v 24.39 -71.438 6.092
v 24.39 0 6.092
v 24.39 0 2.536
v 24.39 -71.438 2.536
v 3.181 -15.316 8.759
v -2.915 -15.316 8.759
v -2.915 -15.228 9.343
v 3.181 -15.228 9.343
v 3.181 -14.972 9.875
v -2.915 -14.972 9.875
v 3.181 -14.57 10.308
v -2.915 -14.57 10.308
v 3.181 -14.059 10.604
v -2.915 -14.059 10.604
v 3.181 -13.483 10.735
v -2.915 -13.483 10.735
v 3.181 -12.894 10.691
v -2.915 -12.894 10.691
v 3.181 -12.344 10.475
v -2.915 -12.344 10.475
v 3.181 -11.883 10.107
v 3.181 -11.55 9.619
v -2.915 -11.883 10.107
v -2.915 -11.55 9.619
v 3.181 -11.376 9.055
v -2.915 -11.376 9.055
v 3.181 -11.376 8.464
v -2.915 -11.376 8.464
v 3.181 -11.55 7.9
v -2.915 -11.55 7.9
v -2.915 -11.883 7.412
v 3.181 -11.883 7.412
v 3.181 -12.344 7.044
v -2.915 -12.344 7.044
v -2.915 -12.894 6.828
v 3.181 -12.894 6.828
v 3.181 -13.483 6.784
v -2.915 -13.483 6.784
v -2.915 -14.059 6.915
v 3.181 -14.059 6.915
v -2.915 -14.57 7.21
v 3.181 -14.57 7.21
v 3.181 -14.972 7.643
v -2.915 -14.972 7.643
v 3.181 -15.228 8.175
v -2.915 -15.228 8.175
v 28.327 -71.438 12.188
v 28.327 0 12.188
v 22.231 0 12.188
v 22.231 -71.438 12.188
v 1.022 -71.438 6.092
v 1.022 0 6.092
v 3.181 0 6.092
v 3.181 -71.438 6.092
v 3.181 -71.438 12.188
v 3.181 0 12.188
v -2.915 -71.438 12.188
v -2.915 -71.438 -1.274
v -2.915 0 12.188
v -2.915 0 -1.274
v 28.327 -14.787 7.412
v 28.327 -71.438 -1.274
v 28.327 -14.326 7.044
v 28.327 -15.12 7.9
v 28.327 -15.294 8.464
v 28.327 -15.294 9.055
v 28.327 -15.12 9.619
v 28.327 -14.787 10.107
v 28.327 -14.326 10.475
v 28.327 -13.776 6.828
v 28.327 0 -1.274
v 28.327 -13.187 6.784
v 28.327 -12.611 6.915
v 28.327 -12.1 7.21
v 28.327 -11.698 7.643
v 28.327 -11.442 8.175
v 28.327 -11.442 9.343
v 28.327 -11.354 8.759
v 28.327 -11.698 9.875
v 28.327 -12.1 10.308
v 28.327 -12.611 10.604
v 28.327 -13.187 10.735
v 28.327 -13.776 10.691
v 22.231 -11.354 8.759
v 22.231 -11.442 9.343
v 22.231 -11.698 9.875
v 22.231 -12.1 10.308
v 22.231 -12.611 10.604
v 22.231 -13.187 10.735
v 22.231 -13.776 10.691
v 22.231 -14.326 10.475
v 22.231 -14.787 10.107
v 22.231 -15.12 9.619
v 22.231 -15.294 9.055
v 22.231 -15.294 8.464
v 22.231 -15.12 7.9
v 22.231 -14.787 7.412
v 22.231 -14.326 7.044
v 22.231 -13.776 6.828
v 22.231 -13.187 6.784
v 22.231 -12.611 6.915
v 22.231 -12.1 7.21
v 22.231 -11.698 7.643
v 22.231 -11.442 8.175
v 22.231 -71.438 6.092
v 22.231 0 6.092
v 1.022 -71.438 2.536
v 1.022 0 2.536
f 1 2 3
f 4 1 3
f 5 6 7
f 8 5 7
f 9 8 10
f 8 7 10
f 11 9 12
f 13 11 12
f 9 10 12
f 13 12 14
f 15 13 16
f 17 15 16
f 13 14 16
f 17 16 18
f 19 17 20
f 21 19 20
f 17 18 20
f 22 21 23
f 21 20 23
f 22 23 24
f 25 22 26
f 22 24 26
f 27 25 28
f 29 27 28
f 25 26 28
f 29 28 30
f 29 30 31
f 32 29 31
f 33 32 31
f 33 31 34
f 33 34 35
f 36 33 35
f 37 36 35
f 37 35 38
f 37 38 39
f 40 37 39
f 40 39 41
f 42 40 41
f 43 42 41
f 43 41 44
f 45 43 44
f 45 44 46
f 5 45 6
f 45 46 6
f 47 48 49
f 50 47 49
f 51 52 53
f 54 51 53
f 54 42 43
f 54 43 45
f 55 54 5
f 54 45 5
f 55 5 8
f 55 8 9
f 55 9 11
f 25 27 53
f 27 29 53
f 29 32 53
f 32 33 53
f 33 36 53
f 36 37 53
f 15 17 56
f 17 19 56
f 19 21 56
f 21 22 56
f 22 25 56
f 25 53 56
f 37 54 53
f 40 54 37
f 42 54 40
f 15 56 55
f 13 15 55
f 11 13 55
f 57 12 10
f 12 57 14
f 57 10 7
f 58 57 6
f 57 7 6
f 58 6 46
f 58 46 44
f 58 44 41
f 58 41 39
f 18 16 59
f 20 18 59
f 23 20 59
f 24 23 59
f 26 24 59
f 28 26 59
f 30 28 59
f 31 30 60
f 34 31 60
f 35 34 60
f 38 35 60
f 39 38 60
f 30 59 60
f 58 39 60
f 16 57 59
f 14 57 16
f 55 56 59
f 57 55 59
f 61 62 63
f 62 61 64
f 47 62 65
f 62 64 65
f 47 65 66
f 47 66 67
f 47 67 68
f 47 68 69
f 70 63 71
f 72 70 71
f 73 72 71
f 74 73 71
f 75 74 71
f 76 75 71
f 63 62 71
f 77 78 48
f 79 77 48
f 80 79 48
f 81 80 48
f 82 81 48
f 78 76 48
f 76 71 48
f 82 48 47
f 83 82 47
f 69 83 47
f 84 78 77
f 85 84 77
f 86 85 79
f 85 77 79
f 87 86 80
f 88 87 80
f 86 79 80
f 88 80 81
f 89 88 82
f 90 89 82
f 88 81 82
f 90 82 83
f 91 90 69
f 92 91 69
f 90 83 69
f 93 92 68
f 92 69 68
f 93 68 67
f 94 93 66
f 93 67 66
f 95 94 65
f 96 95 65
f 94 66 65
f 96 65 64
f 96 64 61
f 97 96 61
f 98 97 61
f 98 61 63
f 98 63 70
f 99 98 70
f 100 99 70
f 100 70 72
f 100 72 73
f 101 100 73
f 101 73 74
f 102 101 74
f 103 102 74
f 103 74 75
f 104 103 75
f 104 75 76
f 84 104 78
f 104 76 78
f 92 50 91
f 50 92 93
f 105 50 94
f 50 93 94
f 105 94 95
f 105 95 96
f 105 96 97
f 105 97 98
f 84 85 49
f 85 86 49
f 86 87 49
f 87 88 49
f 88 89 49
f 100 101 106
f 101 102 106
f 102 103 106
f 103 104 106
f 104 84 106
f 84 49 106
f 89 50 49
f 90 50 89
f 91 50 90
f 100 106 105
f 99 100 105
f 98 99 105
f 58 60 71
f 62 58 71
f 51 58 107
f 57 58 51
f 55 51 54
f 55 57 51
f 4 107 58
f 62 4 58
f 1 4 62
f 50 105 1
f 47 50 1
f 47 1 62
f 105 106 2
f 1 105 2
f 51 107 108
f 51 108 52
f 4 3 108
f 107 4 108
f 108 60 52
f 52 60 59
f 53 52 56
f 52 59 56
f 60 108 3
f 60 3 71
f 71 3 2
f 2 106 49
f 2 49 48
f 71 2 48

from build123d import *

# Parameters (mm, degrees)
F1_DEPTH = 71.4375
F2_R     = 1.9812
F3_DEPTH = 6.096
F4_R     = 1.9812
F5_DEPTH = 6.096


with BuildPart() as f1:
    # F0 (on Front) → F1 (new body)
    with BuildSketch(Plane.XZ):
        Polygon((3.181334, 6.092442), (3.181334, 12.188442), (-2.914666, 12.188442), (-2.914666, -1.273558), (28.327334, -1.273558), (28.327334, 12.188442), (22.231334, 12.188442), (22.231334, 6.092442), (24.390334, 6.092442), (24.390334, 2.536442), (1.022334, 2.536442), (1.022334, 6.092442), align=None)
    extrude(amount=F1_DEPTH)

    # F2 (on face) → F3 (cut, through all)
    with BuildSketch(Plane.YZ.offset(28.327334)):
        with Locations((-13.335, 8.759442)):
            Circle(F2_R)
    extrude(amount=-F3_DEPTH, mode=Mode.SUBTRACT)

    # F4 (on face) → F5 (cut, through all)
    with BuildSketch(Plane(origin=(-2.914666, 0, 0), x_dir=(0, -1, 0), z_dir=(-1, 0, 0))):
        with Locations((13.335, 8.759442)):
            Circle(F4_R)
    extrude(amount=-F5_DEPTH, mode=Mode.SUBTRACT)


solid = f1.part
